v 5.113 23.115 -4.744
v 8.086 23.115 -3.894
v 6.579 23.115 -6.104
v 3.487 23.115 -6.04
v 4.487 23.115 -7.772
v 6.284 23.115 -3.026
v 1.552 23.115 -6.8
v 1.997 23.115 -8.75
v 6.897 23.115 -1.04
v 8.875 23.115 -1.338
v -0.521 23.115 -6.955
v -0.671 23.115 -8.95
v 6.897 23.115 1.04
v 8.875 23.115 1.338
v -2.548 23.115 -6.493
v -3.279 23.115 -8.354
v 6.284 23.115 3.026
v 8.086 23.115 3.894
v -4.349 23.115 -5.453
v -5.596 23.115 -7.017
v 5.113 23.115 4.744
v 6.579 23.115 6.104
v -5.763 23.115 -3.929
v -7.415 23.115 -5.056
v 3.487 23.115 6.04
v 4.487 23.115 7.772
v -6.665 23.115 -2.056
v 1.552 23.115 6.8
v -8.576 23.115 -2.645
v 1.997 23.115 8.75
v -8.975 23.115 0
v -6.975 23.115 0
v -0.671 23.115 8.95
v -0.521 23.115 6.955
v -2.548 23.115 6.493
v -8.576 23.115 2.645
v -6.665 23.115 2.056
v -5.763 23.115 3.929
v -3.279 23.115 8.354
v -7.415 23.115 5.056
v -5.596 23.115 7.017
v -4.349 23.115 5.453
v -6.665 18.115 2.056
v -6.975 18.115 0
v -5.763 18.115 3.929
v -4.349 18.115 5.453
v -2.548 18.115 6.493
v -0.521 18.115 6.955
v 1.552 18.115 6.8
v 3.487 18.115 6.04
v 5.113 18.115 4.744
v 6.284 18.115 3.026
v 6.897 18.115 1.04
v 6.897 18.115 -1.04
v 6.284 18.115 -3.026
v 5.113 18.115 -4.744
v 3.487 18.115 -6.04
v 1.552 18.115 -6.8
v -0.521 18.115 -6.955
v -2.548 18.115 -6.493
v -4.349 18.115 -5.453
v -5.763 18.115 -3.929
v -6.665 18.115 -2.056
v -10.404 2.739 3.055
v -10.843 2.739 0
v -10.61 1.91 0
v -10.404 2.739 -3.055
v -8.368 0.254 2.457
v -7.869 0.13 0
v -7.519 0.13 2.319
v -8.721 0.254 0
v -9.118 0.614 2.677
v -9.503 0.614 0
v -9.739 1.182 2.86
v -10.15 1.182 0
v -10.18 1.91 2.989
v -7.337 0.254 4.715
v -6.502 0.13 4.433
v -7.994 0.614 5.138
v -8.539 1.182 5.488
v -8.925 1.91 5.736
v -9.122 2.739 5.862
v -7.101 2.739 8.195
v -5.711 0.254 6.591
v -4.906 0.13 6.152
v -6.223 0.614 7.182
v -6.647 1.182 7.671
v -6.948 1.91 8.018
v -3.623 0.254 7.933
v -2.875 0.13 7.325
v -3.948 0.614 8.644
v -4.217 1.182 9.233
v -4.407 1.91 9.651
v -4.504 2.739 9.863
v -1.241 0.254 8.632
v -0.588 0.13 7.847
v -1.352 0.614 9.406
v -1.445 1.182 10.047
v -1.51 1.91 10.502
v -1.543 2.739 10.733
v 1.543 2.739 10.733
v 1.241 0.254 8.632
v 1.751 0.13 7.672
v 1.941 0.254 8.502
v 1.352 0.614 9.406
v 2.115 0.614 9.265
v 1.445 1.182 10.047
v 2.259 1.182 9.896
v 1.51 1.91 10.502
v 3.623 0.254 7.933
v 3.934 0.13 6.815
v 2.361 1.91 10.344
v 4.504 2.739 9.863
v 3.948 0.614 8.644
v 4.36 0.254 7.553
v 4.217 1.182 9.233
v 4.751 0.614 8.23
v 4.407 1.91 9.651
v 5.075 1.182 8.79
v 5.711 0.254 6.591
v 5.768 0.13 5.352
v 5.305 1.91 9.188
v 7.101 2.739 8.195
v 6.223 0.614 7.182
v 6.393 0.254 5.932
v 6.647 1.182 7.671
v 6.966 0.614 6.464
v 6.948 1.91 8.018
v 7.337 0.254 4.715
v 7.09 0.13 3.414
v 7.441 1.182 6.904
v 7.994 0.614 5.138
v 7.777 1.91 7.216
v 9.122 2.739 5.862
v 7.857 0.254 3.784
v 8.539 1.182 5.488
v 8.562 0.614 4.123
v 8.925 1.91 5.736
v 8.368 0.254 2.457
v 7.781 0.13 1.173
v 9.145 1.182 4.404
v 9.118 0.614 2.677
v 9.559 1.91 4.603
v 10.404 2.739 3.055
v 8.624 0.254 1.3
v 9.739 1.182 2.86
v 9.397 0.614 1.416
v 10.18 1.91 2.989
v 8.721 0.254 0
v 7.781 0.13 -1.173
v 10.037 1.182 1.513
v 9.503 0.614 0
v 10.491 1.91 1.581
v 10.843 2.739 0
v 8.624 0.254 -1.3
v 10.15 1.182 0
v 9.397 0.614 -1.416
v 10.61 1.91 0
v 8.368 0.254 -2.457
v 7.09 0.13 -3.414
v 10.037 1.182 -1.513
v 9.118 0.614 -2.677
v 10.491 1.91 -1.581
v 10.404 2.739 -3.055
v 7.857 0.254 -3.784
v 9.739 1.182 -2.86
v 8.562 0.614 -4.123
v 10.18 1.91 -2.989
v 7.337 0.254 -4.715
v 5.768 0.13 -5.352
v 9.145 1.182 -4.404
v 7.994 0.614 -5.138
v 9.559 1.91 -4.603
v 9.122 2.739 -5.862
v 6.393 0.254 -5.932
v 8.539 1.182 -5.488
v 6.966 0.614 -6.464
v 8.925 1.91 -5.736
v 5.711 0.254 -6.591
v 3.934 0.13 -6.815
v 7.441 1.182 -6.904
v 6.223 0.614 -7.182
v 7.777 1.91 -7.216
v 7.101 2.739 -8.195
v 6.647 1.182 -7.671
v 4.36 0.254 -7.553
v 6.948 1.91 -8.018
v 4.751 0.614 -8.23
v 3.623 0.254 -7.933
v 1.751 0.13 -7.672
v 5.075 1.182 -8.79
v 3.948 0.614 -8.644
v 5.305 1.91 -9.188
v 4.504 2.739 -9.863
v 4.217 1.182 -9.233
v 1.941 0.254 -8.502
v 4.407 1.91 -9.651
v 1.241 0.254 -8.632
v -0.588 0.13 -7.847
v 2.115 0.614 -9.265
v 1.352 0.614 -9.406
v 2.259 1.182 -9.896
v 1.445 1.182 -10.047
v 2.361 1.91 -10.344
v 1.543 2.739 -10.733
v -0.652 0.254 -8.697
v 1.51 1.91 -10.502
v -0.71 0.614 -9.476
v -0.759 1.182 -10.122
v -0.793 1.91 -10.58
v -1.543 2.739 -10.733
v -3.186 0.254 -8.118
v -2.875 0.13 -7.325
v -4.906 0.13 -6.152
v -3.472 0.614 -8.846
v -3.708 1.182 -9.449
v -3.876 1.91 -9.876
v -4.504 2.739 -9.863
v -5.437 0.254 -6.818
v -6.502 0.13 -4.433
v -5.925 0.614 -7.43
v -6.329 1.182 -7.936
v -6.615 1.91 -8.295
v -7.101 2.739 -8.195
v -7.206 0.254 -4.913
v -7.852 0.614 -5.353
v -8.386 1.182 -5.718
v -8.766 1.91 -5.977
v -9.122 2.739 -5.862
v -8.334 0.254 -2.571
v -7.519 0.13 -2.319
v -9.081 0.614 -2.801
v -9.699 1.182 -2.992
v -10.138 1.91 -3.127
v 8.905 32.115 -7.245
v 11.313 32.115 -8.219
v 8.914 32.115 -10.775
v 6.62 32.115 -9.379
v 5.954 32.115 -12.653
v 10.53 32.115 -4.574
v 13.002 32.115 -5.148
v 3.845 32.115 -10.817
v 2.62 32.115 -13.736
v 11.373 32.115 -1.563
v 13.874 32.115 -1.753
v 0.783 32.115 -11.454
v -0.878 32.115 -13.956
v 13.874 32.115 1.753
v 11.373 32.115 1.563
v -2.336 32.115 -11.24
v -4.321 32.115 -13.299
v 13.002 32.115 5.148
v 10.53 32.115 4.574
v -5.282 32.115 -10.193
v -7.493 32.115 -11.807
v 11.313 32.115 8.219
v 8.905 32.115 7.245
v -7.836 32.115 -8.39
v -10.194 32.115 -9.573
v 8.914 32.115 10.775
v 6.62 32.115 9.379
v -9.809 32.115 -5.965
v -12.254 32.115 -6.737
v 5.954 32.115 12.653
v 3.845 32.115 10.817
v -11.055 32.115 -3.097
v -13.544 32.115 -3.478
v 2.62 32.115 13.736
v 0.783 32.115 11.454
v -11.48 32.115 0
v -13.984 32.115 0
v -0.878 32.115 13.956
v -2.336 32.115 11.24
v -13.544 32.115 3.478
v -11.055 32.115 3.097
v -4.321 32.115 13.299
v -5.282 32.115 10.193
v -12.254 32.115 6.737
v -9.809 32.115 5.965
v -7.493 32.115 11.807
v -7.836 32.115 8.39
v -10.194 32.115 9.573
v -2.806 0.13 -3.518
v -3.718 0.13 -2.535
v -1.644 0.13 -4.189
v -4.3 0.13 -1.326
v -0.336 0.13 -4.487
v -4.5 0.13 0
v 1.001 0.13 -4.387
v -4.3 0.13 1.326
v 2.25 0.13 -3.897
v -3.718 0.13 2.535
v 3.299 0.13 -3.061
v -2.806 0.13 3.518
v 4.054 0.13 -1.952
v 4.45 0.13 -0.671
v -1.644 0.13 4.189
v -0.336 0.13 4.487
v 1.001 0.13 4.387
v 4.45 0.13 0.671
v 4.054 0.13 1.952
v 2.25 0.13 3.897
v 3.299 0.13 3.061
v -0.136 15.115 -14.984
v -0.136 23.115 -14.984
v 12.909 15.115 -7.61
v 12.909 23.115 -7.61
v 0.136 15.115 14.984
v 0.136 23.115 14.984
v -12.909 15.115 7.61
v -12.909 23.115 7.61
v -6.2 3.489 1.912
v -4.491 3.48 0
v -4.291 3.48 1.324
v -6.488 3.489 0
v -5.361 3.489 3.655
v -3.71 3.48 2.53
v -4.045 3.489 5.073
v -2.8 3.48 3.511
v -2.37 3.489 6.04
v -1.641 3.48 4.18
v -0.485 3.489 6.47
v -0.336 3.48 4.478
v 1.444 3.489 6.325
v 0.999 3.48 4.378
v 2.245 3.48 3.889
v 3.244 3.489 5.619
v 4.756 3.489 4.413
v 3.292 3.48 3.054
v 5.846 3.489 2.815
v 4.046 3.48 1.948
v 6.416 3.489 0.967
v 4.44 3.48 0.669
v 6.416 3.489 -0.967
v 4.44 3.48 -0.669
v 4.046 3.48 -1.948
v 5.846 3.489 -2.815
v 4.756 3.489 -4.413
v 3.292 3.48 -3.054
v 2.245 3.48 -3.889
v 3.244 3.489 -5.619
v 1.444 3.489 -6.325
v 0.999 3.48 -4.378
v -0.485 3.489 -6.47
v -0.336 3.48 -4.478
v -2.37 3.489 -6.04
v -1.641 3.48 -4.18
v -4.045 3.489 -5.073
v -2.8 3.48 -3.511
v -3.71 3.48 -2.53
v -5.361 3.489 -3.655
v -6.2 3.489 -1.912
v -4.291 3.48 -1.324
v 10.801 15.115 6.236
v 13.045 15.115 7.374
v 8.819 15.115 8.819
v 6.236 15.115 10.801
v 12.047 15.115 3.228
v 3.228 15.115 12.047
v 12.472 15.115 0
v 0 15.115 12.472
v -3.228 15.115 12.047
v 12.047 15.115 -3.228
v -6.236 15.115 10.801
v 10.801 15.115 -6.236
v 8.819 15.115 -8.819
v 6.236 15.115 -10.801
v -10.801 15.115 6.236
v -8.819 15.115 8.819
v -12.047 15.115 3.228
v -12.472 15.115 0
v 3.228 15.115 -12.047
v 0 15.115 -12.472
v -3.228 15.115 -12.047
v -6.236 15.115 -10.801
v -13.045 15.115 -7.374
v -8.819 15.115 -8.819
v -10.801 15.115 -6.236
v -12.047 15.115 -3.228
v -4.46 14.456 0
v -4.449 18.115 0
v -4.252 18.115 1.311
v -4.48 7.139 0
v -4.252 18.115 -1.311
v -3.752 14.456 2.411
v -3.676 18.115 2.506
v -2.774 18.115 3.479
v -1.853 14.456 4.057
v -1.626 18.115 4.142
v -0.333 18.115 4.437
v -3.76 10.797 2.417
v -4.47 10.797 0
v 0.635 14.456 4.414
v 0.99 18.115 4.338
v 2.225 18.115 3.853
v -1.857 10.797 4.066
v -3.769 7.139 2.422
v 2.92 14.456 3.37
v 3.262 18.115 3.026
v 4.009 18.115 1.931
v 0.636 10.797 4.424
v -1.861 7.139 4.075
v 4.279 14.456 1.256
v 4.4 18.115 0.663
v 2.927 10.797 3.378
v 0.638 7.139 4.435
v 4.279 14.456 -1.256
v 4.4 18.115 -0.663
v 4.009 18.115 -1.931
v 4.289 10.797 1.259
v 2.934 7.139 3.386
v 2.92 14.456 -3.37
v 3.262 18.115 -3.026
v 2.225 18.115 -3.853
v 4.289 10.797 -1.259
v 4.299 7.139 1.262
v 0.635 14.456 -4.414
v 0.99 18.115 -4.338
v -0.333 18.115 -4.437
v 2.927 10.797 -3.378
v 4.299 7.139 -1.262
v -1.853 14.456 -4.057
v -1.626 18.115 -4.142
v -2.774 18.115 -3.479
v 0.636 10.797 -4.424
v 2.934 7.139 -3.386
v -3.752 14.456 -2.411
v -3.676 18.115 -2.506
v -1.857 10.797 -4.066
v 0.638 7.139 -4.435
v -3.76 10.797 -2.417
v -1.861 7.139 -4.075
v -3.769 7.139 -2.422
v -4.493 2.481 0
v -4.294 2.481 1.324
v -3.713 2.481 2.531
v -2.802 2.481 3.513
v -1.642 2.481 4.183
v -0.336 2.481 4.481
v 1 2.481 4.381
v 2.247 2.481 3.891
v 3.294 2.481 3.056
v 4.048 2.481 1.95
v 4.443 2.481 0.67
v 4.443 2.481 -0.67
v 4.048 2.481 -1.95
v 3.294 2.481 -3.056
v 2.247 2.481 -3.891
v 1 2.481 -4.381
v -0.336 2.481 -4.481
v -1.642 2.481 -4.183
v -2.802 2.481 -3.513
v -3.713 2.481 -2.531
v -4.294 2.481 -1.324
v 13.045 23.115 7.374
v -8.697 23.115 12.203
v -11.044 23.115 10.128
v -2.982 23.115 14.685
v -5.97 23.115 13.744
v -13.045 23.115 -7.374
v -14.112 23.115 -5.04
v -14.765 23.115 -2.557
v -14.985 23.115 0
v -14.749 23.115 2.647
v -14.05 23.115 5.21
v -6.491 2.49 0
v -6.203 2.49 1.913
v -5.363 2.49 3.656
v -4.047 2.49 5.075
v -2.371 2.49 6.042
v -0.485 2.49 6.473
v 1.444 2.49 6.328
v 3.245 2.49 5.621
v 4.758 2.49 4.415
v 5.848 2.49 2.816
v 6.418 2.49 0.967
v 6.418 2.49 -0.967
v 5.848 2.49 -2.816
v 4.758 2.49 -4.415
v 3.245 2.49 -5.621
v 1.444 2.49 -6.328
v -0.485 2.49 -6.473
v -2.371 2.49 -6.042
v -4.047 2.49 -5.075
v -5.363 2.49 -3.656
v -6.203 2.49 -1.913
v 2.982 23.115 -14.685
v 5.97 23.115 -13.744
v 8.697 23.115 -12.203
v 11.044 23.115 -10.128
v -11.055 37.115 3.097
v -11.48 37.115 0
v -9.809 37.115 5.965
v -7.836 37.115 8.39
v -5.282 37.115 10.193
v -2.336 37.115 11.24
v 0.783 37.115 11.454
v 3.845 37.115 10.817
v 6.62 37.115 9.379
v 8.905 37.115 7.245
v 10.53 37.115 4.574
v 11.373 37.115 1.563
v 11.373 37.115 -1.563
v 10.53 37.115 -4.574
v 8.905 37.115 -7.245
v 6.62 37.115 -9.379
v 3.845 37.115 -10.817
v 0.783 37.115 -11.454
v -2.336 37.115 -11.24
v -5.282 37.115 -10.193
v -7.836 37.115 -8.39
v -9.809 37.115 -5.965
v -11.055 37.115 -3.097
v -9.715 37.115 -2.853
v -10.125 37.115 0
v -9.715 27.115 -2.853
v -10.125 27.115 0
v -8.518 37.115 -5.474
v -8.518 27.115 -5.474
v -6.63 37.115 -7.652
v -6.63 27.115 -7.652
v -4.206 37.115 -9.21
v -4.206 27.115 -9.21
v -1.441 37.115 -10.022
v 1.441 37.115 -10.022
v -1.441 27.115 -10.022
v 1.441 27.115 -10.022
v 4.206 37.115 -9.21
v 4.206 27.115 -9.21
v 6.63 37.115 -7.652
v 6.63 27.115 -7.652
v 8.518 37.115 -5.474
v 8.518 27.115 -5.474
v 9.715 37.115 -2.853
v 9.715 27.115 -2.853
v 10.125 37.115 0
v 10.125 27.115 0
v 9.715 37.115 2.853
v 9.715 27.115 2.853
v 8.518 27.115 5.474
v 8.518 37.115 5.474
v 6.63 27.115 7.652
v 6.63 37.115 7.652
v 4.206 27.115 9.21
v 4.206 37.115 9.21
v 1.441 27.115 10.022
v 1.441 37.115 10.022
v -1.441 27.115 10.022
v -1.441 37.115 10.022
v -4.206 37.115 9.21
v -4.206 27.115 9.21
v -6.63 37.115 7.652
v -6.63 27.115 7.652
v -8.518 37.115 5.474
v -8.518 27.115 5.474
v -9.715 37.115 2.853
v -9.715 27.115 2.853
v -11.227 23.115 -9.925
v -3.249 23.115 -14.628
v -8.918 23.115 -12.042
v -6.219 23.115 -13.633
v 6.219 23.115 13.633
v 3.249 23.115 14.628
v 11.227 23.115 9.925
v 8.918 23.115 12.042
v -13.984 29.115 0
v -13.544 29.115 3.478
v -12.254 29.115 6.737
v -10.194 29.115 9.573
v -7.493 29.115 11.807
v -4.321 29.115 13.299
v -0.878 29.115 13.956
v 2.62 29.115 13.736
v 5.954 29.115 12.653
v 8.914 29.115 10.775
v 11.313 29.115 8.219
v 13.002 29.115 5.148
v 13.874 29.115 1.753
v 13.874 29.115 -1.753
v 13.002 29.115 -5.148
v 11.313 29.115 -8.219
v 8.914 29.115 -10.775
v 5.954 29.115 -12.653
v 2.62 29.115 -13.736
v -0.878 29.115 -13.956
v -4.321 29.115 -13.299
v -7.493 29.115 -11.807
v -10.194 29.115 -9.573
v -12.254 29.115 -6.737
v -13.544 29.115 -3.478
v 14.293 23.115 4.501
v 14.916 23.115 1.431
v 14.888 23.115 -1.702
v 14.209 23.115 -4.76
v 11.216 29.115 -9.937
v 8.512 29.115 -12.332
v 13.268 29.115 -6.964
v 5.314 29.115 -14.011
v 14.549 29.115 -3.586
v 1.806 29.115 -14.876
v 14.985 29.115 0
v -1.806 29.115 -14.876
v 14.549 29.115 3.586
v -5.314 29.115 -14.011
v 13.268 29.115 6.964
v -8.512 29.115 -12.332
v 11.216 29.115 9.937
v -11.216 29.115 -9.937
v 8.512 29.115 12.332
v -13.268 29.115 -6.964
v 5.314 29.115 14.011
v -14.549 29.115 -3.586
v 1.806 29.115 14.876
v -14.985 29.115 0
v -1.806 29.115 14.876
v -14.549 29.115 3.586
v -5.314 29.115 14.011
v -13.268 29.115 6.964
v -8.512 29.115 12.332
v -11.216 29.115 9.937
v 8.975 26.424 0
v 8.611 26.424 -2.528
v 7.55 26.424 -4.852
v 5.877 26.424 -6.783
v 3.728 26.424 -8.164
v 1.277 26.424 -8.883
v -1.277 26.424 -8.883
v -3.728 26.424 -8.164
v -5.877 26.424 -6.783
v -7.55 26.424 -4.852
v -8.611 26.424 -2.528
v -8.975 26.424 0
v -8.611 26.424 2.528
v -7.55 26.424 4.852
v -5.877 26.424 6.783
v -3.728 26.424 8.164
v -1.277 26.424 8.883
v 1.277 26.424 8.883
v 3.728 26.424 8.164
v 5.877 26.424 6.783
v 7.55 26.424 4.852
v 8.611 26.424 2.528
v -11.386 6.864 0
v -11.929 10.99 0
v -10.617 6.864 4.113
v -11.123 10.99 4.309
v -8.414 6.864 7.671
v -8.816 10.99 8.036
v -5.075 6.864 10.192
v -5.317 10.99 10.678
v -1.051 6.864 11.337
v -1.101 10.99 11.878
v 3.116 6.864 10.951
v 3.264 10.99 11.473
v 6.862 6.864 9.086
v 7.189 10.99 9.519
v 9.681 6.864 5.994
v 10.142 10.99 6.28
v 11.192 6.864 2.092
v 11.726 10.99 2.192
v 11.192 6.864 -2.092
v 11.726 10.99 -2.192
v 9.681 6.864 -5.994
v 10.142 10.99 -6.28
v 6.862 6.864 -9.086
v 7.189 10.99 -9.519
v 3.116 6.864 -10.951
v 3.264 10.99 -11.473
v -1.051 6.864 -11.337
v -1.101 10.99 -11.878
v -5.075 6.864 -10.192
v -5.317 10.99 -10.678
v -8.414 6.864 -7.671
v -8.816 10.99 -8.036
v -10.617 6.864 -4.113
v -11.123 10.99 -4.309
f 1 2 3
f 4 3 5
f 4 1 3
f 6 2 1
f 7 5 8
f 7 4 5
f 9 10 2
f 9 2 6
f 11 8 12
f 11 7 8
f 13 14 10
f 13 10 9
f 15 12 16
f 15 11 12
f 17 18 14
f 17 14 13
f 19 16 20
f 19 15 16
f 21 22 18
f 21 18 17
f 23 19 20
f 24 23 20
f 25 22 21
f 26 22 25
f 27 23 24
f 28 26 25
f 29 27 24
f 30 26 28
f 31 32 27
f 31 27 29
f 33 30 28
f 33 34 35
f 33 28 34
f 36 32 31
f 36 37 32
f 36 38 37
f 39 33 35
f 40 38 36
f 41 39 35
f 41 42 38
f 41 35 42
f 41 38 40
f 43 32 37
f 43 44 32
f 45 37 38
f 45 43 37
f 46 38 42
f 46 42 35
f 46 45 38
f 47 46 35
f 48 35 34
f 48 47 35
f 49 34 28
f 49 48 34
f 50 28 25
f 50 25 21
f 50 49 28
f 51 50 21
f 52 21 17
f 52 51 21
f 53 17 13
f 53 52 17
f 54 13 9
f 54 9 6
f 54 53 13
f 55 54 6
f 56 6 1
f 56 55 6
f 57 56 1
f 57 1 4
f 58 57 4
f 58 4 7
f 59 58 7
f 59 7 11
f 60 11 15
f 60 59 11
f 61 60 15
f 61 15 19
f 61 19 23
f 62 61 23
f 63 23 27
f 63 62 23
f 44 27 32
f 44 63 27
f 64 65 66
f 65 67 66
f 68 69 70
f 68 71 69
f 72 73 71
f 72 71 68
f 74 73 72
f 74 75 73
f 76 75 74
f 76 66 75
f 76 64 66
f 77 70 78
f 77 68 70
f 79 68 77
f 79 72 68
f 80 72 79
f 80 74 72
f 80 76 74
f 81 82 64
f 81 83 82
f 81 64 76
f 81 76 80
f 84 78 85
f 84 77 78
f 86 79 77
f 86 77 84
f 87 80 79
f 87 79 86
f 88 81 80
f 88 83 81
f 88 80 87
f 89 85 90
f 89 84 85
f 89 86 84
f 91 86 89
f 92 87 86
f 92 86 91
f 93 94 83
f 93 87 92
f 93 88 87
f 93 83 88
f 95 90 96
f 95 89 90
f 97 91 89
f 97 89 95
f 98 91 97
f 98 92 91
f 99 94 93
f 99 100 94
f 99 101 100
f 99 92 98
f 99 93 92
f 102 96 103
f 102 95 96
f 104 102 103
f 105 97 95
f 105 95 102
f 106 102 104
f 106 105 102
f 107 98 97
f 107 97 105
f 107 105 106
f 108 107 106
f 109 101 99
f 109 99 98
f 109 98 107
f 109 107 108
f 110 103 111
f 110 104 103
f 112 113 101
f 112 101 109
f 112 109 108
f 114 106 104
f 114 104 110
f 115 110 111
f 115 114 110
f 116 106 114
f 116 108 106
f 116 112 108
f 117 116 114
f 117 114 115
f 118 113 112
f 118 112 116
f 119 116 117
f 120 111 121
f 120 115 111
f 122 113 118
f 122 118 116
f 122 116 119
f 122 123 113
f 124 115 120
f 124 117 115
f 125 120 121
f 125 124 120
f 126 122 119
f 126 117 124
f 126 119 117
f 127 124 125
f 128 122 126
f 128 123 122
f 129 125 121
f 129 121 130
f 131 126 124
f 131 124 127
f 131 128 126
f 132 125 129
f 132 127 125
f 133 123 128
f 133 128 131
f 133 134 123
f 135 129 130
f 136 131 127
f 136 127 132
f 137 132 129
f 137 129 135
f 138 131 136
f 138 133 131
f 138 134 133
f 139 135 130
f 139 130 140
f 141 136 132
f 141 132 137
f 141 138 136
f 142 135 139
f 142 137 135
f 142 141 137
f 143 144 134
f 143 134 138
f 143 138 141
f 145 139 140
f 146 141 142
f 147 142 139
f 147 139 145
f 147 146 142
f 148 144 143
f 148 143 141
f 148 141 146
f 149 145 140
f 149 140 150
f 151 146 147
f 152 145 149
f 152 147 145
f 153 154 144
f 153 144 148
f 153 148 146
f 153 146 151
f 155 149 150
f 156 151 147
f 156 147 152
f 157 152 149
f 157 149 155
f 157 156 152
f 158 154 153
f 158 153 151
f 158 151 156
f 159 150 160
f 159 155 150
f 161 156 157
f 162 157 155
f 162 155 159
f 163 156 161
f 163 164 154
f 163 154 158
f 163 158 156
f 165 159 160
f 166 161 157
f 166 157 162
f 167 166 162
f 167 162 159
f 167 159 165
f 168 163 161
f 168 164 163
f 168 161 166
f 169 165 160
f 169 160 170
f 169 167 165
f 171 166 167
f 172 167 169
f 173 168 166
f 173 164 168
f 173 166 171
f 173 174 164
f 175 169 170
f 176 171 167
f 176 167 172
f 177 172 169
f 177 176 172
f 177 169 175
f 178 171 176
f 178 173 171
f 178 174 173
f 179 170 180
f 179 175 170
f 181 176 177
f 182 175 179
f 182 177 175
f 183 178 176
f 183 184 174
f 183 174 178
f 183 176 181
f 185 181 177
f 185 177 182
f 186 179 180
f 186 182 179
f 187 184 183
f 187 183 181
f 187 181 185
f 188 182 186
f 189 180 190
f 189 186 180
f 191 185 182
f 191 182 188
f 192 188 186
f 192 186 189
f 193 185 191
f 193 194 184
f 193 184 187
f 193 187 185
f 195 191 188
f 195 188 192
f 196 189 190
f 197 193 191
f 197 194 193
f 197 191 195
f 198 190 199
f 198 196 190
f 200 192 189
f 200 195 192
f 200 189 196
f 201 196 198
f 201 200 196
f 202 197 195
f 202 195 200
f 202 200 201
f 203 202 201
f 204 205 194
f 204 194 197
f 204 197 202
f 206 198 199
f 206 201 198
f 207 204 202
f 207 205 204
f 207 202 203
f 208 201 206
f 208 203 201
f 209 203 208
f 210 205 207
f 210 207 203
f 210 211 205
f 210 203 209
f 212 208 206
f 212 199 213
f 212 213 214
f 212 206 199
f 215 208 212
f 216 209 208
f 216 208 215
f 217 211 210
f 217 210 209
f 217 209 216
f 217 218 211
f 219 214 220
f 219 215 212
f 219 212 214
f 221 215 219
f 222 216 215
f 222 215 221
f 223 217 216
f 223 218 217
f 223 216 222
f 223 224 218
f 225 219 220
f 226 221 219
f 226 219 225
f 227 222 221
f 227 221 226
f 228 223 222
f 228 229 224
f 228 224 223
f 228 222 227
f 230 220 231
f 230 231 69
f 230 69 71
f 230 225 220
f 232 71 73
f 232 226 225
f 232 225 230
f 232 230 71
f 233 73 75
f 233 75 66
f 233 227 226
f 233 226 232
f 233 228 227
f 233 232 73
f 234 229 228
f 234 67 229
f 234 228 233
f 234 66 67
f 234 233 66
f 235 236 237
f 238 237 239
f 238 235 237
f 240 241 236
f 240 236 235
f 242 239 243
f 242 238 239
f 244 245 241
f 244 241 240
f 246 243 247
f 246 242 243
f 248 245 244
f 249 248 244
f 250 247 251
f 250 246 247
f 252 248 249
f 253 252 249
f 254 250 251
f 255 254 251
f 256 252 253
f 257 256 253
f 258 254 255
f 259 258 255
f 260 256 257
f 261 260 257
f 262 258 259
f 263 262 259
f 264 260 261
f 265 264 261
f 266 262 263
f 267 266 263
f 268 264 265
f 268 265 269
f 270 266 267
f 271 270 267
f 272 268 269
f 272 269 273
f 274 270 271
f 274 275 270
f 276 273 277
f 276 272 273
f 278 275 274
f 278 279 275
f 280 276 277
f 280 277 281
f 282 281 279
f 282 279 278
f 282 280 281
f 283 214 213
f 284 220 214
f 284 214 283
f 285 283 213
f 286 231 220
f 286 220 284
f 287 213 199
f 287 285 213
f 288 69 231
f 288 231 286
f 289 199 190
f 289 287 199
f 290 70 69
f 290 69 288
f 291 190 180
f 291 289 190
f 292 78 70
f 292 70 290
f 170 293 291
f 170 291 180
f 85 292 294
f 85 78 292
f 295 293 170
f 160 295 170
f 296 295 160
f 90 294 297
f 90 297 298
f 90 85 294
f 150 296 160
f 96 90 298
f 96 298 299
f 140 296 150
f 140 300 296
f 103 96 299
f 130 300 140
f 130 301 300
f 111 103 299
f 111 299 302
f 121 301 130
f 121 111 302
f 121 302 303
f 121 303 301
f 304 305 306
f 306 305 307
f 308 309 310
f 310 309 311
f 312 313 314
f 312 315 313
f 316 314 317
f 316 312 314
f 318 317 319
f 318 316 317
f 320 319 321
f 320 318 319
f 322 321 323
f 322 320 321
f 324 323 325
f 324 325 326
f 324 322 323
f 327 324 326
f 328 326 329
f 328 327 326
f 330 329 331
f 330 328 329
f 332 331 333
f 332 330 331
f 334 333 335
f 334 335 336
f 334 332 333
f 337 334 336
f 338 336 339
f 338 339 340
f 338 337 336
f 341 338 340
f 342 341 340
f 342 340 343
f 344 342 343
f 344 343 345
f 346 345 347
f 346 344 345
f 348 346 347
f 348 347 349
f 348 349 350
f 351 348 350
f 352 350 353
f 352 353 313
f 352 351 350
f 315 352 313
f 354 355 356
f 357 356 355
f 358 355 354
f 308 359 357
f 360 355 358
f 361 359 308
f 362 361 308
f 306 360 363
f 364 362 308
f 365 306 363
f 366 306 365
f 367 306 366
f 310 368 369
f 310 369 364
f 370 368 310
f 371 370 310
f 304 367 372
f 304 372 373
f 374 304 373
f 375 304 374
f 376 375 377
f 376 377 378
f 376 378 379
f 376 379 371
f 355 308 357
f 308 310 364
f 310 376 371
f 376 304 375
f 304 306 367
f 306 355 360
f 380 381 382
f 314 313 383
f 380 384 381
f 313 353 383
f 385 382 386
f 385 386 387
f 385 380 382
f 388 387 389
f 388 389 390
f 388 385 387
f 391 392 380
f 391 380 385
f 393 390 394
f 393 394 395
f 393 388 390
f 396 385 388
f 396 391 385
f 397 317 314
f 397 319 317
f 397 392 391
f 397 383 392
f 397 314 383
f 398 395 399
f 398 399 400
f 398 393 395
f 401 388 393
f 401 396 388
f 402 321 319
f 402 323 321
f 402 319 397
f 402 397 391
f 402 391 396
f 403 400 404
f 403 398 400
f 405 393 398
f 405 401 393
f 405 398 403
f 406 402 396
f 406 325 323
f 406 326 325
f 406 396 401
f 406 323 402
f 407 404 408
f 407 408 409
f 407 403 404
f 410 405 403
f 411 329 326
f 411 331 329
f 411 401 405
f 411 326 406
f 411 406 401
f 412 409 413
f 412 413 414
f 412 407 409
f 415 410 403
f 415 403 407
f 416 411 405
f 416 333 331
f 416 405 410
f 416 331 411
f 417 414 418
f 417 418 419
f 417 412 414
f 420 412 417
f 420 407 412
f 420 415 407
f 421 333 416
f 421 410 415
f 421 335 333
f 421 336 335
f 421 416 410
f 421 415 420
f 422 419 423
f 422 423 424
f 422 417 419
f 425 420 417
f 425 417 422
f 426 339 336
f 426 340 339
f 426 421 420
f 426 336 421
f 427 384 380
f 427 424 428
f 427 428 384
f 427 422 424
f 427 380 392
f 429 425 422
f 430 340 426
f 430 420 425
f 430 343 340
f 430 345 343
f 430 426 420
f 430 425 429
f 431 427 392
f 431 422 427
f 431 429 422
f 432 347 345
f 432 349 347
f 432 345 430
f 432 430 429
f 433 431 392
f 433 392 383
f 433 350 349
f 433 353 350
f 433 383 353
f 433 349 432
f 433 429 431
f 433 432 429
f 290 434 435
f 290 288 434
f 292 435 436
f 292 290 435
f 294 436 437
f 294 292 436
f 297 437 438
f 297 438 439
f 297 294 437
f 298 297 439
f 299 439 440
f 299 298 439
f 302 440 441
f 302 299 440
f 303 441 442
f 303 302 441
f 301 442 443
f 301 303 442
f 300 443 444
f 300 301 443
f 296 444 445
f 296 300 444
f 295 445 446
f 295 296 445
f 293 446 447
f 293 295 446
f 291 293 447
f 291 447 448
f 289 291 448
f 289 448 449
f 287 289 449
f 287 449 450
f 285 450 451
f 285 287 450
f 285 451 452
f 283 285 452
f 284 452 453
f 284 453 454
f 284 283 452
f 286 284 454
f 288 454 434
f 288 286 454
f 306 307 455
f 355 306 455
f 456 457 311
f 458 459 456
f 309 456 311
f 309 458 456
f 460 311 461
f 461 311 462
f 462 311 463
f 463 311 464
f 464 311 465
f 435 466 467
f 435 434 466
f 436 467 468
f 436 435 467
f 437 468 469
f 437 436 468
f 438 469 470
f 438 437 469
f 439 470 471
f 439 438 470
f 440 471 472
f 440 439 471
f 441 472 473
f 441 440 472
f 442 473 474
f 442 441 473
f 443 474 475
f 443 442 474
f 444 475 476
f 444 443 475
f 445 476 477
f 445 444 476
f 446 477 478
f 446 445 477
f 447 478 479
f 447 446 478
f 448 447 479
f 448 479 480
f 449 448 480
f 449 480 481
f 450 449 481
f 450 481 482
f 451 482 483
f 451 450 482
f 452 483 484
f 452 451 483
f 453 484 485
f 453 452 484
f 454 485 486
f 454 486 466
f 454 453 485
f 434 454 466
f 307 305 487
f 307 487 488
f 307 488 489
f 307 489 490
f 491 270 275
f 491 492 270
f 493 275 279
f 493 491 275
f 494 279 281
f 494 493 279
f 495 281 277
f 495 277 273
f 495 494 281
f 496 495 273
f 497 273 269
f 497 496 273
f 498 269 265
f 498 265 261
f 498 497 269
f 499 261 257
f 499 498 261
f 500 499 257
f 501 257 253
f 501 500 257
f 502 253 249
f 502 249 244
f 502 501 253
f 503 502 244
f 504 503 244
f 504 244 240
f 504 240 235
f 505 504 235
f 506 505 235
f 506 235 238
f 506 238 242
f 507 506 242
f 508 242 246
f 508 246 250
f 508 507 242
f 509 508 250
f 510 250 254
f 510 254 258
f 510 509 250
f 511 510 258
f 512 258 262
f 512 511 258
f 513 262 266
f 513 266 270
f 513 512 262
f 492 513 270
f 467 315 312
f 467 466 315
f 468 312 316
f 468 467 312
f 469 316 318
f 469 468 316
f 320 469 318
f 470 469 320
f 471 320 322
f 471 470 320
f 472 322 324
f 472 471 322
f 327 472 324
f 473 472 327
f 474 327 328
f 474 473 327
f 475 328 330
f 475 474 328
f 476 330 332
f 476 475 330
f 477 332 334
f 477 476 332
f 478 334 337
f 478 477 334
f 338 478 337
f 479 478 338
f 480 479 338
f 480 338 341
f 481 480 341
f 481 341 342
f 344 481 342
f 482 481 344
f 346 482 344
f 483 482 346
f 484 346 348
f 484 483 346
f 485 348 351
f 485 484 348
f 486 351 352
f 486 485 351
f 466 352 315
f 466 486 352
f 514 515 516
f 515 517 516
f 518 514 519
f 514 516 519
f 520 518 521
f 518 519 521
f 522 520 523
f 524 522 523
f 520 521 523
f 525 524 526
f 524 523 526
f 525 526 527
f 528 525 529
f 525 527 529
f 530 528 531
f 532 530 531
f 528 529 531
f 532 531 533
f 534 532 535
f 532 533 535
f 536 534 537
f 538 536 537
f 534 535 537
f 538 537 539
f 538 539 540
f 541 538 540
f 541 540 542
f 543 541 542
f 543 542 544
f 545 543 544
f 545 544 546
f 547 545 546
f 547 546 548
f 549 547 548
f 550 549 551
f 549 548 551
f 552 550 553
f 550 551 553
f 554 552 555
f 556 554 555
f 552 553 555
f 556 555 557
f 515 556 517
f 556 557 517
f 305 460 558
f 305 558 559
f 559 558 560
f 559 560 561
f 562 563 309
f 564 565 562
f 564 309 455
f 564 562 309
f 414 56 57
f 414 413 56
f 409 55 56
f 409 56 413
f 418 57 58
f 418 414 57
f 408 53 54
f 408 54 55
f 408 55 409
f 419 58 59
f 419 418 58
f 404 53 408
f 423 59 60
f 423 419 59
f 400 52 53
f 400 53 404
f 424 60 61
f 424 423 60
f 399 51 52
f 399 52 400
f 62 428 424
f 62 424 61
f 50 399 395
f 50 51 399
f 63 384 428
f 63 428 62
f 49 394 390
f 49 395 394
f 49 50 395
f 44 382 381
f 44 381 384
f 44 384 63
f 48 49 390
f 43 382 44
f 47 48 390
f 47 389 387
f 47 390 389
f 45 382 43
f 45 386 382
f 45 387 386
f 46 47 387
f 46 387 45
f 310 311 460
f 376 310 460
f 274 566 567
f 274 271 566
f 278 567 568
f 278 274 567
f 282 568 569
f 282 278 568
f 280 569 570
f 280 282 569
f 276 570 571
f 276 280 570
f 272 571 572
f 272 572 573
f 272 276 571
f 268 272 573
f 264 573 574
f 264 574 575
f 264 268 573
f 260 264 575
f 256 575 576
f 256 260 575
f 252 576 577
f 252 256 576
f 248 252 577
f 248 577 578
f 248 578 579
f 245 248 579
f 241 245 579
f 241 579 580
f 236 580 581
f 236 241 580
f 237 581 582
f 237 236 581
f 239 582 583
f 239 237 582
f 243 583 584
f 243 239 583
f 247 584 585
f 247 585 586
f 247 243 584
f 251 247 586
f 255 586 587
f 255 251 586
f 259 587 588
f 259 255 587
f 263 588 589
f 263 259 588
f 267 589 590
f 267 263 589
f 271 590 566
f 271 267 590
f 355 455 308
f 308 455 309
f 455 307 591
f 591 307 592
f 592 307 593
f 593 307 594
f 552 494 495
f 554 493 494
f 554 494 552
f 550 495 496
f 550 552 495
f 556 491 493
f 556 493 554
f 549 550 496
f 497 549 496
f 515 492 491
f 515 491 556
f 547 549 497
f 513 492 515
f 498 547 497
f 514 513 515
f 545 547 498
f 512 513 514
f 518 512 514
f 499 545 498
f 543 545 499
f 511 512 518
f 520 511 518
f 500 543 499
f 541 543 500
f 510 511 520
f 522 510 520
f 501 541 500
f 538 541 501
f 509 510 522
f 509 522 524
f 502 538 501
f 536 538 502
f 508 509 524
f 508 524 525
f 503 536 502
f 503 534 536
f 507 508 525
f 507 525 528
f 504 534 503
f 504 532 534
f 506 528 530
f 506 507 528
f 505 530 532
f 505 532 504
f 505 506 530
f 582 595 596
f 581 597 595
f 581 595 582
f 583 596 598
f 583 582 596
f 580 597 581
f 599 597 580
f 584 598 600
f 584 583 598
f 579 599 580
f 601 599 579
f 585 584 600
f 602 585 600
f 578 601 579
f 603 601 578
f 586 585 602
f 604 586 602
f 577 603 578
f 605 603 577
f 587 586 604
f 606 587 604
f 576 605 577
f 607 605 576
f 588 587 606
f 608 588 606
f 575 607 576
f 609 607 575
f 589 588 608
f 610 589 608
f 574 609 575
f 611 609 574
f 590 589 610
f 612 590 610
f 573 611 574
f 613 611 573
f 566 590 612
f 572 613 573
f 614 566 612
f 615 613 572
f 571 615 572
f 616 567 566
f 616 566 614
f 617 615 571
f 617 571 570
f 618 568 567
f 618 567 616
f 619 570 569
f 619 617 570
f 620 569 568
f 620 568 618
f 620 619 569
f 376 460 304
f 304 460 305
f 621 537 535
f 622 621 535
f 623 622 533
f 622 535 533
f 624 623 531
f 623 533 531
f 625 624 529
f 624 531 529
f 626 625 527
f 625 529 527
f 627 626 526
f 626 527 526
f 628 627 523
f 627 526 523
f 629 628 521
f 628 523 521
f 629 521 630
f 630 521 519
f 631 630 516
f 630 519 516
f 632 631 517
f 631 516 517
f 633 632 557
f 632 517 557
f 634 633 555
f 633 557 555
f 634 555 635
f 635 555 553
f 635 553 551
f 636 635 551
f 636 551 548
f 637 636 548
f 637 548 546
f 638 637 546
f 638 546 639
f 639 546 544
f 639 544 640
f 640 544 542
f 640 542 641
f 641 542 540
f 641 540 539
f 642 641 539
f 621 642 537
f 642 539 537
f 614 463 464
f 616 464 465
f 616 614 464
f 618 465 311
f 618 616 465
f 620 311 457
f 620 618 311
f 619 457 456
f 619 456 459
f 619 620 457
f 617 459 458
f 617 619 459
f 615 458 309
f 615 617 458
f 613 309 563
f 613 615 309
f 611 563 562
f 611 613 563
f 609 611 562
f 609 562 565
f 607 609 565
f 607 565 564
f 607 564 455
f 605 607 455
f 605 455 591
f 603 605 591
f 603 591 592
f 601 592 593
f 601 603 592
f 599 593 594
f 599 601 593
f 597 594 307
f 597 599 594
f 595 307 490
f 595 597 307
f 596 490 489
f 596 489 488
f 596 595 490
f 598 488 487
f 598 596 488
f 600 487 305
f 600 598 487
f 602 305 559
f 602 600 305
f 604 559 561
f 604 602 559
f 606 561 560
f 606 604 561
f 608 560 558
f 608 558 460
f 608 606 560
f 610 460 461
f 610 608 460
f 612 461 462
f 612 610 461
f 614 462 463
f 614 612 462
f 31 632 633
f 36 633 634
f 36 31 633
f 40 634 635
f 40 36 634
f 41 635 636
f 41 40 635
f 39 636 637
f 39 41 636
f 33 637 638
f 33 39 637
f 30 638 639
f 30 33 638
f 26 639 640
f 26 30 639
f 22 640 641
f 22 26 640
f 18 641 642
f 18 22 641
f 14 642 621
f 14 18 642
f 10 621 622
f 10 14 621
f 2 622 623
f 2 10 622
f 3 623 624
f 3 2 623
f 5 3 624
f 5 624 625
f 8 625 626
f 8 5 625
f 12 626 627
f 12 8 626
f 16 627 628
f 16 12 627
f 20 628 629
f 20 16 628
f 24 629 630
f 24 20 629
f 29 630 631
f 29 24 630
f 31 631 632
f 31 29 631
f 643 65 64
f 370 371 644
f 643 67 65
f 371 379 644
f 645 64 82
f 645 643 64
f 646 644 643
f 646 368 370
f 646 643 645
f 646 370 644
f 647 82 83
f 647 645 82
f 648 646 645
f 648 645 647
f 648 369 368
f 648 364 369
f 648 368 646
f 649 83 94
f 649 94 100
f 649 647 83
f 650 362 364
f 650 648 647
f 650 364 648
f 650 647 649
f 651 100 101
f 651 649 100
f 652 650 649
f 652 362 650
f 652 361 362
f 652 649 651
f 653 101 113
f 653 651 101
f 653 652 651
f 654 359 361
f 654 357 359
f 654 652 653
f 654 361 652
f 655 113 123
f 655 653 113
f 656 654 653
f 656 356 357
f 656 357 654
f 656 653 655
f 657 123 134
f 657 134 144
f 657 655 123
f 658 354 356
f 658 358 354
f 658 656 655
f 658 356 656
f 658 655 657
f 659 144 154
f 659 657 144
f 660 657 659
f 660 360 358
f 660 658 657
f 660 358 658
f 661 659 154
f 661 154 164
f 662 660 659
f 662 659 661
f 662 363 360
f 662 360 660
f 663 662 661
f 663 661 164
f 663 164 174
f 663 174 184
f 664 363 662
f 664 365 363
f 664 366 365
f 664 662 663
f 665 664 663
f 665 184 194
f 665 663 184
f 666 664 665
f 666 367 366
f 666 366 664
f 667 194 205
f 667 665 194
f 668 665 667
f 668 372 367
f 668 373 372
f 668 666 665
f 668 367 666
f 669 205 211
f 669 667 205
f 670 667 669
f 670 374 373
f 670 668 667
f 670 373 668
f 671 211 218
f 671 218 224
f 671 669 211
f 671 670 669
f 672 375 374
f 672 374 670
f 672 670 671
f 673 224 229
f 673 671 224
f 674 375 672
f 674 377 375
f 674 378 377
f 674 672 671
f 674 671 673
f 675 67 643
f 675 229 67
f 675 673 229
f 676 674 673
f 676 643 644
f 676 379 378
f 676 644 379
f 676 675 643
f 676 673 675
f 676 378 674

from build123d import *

# Parameters (mm, degrees)
SKETCH_4_R             = 12.471621376
EXTRUDE_2_DEPTH        = 8
SKETCH_6_R             = 8.974783973
EXTRUDE_3_DEPTH        = 8
HOLE_WIZARD_M201_D     = 20.25
HOLE_WIZARD_M201_DEPTH = 10
HOLE_WIZARD_M201_TIP   = 6.083713768


with BuildPart() as part:
    # Эскиз2 → Повернуть1 (revolve)
    with BuildSketch(Plane.XY):
        with BuildLine():
            Line((-4.5, 0.130191103), (-7.868865891, 0.130191103))
            ThreePointArc((-7.868865891, 0.130191103), (-9.846990335, 0.874747979), (-10.843230675, 2.73884198))
            Line((-10.843230675, 2.73884198), (-12.471621376, 15.115075065))
            Line((-12.471621376, 15.115075065), (-12.471621376, 23.115075065))
            Line((-12.471621376, 23.115075065), (-14.984883962, 23.115075065))
            Line((-14.984883962, 23.115075065), (-14.984883962, 29.115075065))
            Line((-14.984883962, 29.115075065), (-13.983803036, 29.115075065))
            Line((-13.983803036, 29.115075065), (-13.983803036, 32.115075065))
            Line((-13.983803036, 32.115075065), (-11.48027645, 32.115075065))
            Line((-11.48027645, 32.115075065), (-11.48027645, 37.115075065))
            Line((-11.48027645, 37.115075065), (-8.974783973, 37.115075065))
            Line((-8.974783973, 37.115075065), (-8.974783973, 23.115075065))
            Line((-8.974783973, 23.115075065), (-6.974783973, 23.115075065))
            Line((-6.974783973, 23.115075065), (-6.974783973, 18.115075065))
            Line((-6.974783973, 18.115075065), (-4.449353589, 18.115075065))
            Line((-4.449353589, 18.115075065), (-4.490567157, 3.479857527))
            Line((-4.490567157, 3.479857527), (-6.488062408, 3.489211927))
            Line((-6.488062408, 3.489211927), (-6.49087648, 2.489915788))
            Line((-6.49087648, 2.489915788), (-4.493381229, 2.480561388))
            Line((-4.493381229, 2.480561388), (-4.5, 0.130191103))
        make_face()
    revolve(axis=Axis((0, 0, 0), (0, 1, 0)))

    # Эскиз4 → Бобышка-Вытянуть2 (add)
    with BuildSketch(Plane(origin=(0, 23.115075065, 0), x_dir=(-1, 0, 0), z_dir=(0, -1, 0))):
        Polygon((-13.044923547, -7.374057026), (-0.13634106, -14.984263695), (12.908582486, -7.610206669), (13.044923547, 7.374057026), (0.13634106, 14.984263695), (-12.908582486, 7.610206669), align=None)
        Circle(SKETCH_4_R, mode=Mode.SUBTRACT)
    extrude(amount=EXTRUDE_2_DEPTH)

    # Эскиз6 → Бобышка-Вытянуть3 (add)
    with BuildSketch(Plane(origin=(0, 37.115075065, 0), x_dir=(1, 0, 0), z_dir=(0, 1, 0))):
        Circle(SKETCH_6_R)
    extrude(amount=-EXTRUDE_3_DEPTH)

    # Сверло под метчик  спиральное M201
    with Locations(Plane(origin=(0, 37.115075065, 0), x_dir=(1, 0, 0), z_dir=(0, 1, 0))):
        with Locations((0, 0)):
            Hole(HOLE_WIZARD_M201_D / 2, depth=HOLE_WIZARD_M201_DEPTH)
            with Locations((0, 0, -(HOLE_WIZARD_M201_DEPTH + HOLE_WIZARD_M201_TIP / 2))):  # 118° drill point
                Cone(0, HOLE_WIZARD_M201_D / 2, HOLE_WIZARD_M201_TIP, mode=Mode.SUBTRACT)


solid = part.part
